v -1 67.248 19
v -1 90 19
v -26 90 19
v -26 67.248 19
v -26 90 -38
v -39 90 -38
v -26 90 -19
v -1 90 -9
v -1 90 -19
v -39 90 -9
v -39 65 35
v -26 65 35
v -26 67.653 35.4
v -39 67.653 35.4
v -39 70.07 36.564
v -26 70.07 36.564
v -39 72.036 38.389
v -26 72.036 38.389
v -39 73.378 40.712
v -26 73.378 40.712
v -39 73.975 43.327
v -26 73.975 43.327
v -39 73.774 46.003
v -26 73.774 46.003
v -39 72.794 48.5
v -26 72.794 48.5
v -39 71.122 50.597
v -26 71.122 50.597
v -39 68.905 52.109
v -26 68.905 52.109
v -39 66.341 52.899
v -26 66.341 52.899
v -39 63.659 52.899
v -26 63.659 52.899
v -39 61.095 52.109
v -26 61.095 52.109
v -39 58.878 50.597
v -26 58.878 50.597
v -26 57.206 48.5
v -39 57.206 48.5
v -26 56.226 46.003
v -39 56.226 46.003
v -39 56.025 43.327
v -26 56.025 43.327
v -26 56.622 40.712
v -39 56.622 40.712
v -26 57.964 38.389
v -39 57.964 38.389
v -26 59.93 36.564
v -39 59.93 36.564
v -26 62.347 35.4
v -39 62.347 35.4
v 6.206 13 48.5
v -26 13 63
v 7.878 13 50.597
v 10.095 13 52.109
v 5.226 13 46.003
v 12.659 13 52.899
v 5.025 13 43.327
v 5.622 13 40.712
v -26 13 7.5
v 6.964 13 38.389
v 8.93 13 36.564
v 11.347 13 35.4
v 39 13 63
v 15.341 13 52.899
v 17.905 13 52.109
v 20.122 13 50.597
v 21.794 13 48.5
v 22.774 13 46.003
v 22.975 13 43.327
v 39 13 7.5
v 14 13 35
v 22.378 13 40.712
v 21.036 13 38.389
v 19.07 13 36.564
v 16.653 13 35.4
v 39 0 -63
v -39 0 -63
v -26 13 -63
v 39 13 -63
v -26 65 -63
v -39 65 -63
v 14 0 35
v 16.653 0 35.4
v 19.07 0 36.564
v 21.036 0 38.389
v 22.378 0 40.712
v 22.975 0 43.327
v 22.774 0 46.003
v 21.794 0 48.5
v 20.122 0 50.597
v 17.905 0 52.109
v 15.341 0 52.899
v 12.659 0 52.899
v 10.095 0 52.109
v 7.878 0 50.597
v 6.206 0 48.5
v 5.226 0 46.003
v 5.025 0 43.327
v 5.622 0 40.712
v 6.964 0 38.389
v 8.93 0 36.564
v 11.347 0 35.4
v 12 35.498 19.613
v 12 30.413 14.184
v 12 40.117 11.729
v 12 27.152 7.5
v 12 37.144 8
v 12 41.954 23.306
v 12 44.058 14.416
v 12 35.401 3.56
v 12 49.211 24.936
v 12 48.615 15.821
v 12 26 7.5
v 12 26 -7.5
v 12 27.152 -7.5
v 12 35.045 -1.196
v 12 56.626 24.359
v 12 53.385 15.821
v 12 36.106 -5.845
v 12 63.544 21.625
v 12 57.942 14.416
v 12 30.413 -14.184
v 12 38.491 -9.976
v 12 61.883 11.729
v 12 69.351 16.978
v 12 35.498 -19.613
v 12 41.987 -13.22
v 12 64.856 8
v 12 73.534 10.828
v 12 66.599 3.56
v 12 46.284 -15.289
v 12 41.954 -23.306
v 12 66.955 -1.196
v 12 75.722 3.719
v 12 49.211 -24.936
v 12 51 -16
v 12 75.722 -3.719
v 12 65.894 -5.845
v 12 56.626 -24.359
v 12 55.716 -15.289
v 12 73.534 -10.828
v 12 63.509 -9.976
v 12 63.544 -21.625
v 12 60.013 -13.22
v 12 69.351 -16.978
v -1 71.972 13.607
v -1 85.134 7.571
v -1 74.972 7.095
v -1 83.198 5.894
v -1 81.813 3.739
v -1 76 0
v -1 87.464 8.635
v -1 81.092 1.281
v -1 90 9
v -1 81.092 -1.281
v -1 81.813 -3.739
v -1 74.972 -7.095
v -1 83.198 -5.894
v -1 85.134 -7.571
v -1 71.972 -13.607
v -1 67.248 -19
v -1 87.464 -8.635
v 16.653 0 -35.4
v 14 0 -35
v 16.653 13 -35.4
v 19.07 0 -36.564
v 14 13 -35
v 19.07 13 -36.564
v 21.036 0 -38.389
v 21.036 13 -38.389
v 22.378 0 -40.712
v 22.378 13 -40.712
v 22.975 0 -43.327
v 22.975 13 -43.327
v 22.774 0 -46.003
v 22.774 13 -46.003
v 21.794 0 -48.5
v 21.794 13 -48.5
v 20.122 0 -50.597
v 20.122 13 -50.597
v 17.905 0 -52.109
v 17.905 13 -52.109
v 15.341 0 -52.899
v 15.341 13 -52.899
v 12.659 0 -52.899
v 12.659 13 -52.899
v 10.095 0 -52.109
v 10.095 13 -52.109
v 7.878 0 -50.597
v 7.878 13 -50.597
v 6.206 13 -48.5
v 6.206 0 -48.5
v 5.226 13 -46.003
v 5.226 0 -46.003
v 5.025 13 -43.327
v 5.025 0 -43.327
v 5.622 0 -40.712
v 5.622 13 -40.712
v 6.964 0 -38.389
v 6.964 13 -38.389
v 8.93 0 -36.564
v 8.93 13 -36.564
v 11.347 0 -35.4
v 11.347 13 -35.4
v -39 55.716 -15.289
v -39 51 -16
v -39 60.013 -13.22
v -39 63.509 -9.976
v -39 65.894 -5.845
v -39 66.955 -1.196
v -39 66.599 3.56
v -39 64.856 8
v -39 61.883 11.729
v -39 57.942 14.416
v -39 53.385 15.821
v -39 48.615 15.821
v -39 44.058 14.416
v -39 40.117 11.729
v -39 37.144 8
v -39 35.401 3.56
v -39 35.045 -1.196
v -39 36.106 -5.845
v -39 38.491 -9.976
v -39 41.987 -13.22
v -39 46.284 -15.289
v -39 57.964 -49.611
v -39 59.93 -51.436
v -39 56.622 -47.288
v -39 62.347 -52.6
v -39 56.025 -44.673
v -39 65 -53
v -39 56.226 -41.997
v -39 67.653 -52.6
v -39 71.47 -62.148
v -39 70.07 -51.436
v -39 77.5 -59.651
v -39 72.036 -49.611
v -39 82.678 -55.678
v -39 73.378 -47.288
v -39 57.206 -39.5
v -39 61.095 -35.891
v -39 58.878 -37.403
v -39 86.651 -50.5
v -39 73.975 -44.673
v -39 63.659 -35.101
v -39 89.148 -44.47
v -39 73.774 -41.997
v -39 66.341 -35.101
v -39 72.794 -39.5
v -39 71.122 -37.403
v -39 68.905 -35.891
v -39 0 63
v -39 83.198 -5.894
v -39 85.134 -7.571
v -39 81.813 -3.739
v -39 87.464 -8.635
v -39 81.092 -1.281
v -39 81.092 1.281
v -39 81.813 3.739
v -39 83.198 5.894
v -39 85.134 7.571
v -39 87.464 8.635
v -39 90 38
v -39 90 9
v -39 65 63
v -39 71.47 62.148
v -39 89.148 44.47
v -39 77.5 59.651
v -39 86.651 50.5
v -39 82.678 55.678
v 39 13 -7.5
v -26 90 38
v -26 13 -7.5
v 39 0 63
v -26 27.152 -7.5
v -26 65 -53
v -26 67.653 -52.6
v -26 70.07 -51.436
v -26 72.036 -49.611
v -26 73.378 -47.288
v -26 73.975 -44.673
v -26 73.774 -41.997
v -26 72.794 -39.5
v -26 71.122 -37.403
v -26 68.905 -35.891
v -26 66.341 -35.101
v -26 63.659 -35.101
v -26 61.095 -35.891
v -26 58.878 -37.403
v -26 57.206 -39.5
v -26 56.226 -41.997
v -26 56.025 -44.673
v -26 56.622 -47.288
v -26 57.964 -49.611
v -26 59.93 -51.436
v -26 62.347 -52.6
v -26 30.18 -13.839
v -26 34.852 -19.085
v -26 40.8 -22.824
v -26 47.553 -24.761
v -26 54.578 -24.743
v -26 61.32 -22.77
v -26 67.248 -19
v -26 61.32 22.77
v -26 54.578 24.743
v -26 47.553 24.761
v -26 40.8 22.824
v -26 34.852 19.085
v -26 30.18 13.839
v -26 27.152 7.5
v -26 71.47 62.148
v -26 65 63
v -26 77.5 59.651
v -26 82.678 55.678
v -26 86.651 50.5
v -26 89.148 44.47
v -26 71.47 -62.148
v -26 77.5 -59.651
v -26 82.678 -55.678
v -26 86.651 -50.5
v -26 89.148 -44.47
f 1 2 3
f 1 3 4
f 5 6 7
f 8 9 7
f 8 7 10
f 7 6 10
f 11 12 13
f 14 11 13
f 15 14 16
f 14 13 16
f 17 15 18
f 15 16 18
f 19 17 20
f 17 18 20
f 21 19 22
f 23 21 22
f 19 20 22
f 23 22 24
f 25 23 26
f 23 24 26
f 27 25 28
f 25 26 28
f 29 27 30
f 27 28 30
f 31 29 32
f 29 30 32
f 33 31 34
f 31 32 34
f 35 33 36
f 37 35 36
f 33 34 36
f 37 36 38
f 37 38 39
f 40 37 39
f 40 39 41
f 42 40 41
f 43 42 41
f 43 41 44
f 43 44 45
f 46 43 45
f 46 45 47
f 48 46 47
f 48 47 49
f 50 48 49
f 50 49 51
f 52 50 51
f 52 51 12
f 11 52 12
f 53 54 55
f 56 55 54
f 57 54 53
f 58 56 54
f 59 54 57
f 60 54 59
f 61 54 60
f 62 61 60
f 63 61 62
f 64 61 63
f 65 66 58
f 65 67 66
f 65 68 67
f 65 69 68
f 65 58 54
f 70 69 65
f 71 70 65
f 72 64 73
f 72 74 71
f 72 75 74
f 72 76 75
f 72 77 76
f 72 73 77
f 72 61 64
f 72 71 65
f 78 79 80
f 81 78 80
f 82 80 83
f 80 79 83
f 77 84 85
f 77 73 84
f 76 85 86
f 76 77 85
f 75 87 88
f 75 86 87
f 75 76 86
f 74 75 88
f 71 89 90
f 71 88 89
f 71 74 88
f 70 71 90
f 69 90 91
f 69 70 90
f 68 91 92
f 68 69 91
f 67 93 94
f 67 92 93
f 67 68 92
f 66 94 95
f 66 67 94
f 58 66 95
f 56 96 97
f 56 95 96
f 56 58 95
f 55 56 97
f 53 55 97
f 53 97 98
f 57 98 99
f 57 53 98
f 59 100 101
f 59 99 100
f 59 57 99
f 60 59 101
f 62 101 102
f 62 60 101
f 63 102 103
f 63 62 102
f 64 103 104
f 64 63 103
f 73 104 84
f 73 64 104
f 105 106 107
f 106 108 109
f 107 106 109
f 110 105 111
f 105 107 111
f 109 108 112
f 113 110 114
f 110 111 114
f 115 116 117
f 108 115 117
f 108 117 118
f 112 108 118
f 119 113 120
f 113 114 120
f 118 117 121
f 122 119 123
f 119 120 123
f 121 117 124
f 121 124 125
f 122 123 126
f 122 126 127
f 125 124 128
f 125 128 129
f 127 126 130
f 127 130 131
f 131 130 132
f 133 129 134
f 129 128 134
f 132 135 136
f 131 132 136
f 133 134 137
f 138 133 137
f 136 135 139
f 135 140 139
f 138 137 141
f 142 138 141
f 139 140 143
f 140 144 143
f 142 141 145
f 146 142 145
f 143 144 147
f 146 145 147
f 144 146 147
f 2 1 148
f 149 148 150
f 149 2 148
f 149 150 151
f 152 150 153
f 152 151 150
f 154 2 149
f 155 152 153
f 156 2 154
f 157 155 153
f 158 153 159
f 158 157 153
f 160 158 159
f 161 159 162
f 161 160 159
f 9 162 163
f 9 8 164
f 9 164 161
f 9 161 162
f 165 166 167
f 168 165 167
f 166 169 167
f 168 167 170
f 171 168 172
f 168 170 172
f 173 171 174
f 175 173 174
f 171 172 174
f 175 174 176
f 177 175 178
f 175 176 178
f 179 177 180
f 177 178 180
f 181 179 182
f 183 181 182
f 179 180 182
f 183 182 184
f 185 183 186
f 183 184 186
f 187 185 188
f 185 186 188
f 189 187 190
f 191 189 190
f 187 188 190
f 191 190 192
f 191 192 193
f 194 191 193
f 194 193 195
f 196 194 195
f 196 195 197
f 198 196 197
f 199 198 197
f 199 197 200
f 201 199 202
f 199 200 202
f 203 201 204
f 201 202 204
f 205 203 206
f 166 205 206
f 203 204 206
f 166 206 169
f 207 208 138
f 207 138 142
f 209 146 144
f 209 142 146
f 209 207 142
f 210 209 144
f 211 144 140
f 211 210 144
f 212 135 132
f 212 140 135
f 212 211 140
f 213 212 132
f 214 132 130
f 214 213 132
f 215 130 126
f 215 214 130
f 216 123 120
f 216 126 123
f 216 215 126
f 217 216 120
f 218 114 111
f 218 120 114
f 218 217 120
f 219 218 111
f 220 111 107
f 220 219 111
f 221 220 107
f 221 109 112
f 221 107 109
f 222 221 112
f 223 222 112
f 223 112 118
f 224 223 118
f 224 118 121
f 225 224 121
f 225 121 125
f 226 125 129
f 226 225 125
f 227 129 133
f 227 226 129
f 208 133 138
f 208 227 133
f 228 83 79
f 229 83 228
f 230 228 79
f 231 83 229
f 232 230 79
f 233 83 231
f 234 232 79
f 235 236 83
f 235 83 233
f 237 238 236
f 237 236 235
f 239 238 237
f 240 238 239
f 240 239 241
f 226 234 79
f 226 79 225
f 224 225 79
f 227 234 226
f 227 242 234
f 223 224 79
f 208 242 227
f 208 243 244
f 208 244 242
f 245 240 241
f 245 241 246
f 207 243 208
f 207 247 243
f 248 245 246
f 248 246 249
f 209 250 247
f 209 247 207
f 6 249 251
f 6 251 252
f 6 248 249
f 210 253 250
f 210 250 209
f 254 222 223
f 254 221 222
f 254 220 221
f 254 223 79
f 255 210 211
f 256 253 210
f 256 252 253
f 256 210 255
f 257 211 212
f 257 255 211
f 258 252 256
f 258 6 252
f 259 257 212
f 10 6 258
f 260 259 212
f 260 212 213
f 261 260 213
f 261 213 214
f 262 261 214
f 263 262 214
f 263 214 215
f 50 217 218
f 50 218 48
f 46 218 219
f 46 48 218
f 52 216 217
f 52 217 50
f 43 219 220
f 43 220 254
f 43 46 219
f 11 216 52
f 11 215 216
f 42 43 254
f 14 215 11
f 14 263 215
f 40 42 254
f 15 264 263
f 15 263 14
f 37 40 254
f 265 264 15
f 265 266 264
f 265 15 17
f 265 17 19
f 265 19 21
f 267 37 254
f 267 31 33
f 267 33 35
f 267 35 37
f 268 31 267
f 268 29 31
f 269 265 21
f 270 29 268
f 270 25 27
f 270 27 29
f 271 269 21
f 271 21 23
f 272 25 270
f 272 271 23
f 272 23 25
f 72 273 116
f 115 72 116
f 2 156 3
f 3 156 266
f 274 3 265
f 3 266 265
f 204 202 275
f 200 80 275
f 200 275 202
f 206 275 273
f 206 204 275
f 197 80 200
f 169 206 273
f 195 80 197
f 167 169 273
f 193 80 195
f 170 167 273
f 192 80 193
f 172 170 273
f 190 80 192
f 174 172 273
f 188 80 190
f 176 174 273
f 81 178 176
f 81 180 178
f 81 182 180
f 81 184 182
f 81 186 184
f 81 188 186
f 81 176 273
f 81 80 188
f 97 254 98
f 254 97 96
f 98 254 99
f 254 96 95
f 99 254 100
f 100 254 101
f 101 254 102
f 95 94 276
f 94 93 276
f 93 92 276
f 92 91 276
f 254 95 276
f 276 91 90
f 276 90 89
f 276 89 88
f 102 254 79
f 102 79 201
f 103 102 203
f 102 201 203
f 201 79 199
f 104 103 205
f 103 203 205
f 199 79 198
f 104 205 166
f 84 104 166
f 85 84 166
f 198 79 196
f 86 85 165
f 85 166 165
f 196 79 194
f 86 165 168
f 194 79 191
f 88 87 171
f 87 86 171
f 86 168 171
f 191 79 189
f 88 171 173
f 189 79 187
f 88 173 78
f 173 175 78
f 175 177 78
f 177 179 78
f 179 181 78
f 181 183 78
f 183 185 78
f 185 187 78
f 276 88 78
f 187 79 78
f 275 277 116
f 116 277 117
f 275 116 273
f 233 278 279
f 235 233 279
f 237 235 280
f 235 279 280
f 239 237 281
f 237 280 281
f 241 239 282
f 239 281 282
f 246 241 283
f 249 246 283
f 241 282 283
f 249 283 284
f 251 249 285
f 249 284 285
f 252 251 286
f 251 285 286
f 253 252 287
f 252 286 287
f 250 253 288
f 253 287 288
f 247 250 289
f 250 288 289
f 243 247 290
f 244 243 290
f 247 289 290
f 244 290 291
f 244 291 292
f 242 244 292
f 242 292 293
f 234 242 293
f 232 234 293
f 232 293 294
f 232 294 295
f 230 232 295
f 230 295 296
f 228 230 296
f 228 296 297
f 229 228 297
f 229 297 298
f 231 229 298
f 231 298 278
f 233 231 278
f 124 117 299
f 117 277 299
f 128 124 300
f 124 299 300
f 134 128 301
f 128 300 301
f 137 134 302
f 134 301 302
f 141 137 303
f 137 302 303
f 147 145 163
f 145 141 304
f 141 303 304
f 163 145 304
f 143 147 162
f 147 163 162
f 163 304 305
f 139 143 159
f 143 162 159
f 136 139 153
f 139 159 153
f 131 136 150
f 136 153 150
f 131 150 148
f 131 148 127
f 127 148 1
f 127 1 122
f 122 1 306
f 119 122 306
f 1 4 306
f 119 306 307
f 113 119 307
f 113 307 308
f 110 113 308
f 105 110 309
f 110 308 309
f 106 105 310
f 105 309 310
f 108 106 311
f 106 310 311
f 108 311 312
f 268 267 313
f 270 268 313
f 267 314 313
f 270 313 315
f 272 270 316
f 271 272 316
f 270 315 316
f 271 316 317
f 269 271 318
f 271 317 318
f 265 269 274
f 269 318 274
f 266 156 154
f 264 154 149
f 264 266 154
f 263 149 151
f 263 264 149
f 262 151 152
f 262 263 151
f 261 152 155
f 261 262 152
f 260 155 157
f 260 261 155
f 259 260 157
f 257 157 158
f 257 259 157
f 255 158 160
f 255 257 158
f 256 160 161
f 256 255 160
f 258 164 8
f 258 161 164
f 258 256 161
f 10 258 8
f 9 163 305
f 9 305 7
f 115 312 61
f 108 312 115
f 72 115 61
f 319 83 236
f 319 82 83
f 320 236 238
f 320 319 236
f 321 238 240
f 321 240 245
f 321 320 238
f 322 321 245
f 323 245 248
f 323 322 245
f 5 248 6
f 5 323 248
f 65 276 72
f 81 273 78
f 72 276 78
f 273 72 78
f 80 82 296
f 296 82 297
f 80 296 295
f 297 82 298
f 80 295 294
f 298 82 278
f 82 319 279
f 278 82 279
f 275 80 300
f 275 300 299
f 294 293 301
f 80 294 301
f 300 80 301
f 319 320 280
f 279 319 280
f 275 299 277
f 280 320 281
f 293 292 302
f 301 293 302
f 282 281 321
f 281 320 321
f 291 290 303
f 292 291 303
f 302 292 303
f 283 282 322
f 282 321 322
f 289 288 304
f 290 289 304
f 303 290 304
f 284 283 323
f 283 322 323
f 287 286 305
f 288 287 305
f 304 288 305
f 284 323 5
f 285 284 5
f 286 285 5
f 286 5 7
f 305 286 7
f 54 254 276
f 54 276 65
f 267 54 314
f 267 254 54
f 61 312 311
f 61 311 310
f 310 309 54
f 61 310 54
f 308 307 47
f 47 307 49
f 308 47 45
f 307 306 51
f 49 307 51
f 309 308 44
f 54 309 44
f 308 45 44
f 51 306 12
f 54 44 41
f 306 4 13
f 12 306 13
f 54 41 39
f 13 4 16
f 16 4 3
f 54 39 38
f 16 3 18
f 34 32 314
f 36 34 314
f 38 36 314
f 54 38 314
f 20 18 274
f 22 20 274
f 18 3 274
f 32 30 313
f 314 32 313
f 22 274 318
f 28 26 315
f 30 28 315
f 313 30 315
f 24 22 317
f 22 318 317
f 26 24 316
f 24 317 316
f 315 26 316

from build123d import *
from build123d.topology import SkipClean

# Parameters (mm, degrees)
SKETCH2_W               = 78
SKETCH2_H               = 126
BOSS_EXTRUDE1_DEPTH     = 13
SKETCH3_W               = 126
SKETCH3_H               = 77
BOSS_EXTRUDE2_DEPTH     = 13
FILLET1_R               = 25
SKETCH4_R               = 9
CUT_EXTRUDE1_DEPTH      = 128.647953372
SKETCH5_R               = 25
BOSS_EXTRUDE3_DEPTH     = 38
BOSS_EXTRUDE4_DEPTH     = 25
CUT_EXTRUDE3_DEPTH      = 128.647953372
CUT_EXTRUDE3_DEPTH_BACK = 128.647953372
SKETCH5_5_R             = 16
RIB1_START              = -7.5
RIB1_DEPTH              = 15
SKETCH7_R               = 9
CUT_EXTRUDE4_DEPTH      = 107.85972113


with BuildPart() as part:
    # Sketch2 → Boss-Extrude1 (new body)
    with BuildSketch(Plane(origin=(0, 0, 0), x_dir=(1, 0, 0), z_dir=(0, 1, 0))):
        Rectangle(SKETCH2_W, SKETCH2_H)
    extrude(amount=BOSS_EXTRUDE1_DEPTH)

    # Sketch3 → Boss-Extrude2 (add)
    with BuildSketch(Plane.ZY.offset(39)):
        with Locations((0, 51.5)):
            Rectangle(SKETCH3_W, SKETCH3_H)
    extrude(amount=-BOSS_EXTRUDE2_DEPTH)

    # Fillet1
    fillet1_edges = [part.edges().sort_by_distance(p)[0] for p in [
        (-32.5, 90, -63),
        (-32.5, 90, 63),
    ]]
    fillet(fillet1_edges, radius=FILLET1_R)

    # Sketch4 → Cut-Extrude1 (cut, through all)
    with BuildSketch(Plane(origin=(-26, 0, 0), x_dir=(0, 0, -1), z_dir=(1, 0, 0))):
        with Locations((-44, 65)):
            Circle(SKETCH4_R)
        with Locations((44, 65)):
            Circle(SKETCH4_R)
    extrude(amount=-CUT_EXTRUDE1_DEPTH, mode=Mode.SUBTRACT)

    # Sketch5 → Boss-Extrude3 (add)
    with BuildSketch(Plane(origin=(-26, 0, 0), x_dir=(0, 0, -1), z_dir=(1, 0, 0))):
        with Locations((0, 51)):
            Circle(SKETCH5_R)
    extrude(amount=BOSS_EXTRUDE3_DEPTH)

    # Sketch5<3> → Boss-Extrude4 (add)
    with BuildSketch(Plane(origin=(-26, 0, 0), x_dir=(0, 0, -1), z_dir=(1, 0, 0))):
        with BuildLine():
            Line((-9, 90), (-19, 90))
            Line((-19, 90), (-19, 67.248076809))
            ThreePointArc((-19, 67.248076809), (0, 76), (19, 67.248076809))
            Line((19, 67.248076809), (19, 90))
            Line((19, 90), (9, 90))
            ThreePointArc((9, 90), (0, 81), (-9, 90))
        make_face()
    extrude(amount=BOSS_EXTRUDE4_DEPTH)

    # Sketch5<5> → Cut-Extrude3 (cut, two sides: drawn at the far end of the back side and taken through both)
    with SkipClean():  # the faces are left unmerged after this step: merging them gives an invalid solid
        with BuildSketch(Plane(origin=(-26, 0, 0), x_dir=(0, 0, -1), z_dir=(1, 0, 0)).offset(-CUT_EXTRUDE3_DEPTH_BACK)):
            with Locations((0, 51)):
                Circle(SKETCH5_5_R)
            with BuildLine():
                Line((9, 90), (-9, 90))
                ThreePointArc((-9, 90), (0, 81), (9, 90))
            make_face()
        extrude(amount=CUT_EXTRUDE3_DEPTH + CUT_EXTRUDE3_DEPTH_BACK, mode=Mode.SUBTRACT)
    add(part.part.scale(1), mode=Mode.REPLACE)  # the faces are merged on a copy

    # Rib1: read off the stored shape, not the designer's step
    # Rib1 outline → Rib1 (add)
    with BuildSketch(Plane.XY.offset(RIB1_START)):
        Polygon((12, 26), (12, 27.151519965), (-26, 27.151519965), (-26, 13), (39, 13), align=None)
    extrude(amount=RIB1_DEPTH)

    # Sketch7 → Cut-Extrude4 (cut, symmetric)
    with BuildSketch(Plane(origin=(0, 13, 0), x_dir=(1, 0, 0), z_dir=(0, 1, 0))):
        with Locations(Location((14, 44, 0), (0, 0, 270))):
            Circle(SKETCH7_R)
    cut_extrude4 = extrude(amount=CUT_EXTRUDE4_DEPTH, both=True, mode=Mode.SUBTRACT)

    # Mirror1: Cut-Extrude4 across plane
    add(cut_extrude4.mirror(Plane.XY), mode=Mode.SUBTRACT)


solid = part.part
